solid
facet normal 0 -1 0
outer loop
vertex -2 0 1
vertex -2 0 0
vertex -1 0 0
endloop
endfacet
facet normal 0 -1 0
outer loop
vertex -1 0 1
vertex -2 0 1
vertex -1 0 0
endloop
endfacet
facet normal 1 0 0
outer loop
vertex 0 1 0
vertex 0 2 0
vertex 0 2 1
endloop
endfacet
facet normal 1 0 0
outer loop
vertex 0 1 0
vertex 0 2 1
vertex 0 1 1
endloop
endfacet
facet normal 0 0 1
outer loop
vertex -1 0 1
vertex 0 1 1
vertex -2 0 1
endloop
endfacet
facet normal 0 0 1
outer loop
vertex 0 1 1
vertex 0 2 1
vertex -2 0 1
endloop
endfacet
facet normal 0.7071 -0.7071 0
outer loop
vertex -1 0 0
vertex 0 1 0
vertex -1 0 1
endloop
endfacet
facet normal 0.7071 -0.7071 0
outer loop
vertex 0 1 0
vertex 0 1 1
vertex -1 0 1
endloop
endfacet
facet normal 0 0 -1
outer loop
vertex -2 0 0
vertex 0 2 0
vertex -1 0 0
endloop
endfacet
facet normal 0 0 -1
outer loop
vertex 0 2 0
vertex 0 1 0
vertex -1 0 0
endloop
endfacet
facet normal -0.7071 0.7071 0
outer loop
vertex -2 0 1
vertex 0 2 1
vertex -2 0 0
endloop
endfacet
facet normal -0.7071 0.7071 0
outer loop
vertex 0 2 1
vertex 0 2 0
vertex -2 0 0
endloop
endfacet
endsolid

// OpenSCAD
rotate_extrude(angle=-90, $fn=3) translate([-2,0]) square([1,1]);
